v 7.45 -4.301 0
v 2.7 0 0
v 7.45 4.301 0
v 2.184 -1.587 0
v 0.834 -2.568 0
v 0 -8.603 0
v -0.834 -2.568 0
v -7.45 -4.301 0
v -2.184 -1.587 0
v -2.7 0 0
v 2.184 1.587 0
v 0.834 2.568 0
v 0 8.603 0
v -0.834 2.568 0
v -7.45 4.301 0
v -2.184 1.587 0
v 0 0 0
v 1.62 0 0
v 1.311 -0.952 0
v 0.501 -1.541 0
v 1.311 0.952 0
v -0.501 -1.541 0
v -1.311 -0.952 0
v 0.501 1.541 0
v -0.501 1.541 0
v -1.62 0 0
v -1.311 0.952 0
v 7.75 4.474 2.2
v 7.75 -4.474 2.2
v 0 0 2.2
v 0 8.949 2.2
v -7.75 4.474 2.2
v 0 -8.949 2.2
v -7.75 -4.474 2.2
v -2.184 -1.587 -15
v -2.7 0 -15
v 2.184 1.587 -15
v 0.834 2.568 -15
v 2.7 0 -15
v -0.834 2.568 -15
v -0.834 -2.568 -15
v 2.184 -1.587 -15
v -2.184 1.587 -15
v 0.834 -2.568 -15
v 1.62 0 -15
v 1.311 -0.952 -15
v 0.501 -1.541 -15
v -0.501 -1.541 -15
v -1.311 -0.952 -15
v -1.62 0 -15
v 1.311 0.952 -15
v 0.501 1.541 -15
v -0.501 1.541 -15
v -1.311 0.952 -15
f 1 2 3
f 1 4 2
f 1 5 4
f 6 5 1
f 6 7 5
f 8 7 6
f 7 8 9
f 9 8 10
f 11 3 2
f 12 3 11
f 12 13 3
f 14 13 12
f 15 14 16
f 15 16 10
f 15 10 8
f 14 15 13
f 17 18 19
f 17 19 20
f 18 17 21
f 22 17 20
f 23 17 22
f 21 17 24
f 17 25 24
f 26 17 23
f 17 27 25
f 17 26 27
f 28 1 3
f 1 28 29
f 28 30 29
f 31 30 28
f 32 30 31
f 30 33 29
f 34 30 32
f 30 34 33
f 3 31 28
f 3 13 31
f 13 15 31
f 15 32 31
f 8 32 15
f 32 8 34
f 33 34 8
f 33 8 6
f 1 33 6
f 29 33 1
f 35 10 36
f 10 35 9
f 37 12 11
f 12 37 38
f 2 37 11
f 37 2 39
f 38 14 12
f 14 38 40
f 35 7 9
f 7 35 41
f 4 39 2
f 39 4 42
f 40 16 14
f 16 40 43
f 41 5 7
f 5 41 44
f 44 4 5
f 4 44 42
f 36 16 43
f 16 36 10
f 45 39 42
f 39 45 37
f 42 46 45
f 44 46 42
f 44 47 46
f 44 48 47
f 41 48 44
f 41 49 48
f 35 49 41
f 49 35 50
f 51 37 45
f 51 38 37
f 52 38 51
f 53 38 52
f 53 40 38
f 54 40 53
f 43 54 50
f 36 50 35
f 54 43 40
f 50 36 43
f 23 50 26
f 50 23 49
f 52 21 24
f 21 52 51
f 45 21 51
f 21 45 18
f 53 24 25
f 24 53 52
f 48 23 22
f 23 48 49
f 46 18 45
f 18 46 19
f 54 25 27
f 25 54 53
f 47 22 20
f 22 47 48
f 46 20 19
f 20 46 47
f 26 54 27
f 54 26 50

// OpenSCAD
// file: ../Lib/HexGrid.scad
//Size of the hexagons, from one end to another
hexDiameter = 17.5;

//Height of the different pieces
hexHeight = 2.2;
hexMiddleHeight = 1.6;

//Thickness of a beam of the hex piece
beamThickness = 1;

//By how much should the polygon piece slope at the bottom layer?
hexPlay = 0.3;

//Generate a parenting node for the according hexagon
function hexNode(hexagon, height = hexHeight + hexMiddleHeight, rotation = 0) =
			//Translative coordinates
			[	[	hexDiameter * hexagon[0] + ((hexagon[1] % 2 != 0) ? hexDiameter/2 : 0),
					hexDiameter * sin(60) * hexagon[1],
					height],
			//Rotation coordinates
				[	0, 0, 60 * rotation] ];

module hexSegment(b2, t2, b1 = 0.0001, t1 = 0.0001, h) {
	fixDist = 0;

	render(convexity = 3)
	for(i=[0:5]) rotate([0, 0, i * 60])
	polyhedron(
		points = [	//Lower segments
					[b1, -tan(30) *b1, 0],	//0 - bottom left
					[b1,  tan(30) *b1, 0],	//1 - top left
					[b2,  tan(30) *b2, 0],	//2 - top right
					[b2, -tan(30) *b2, 0],	//3 - bottom right
					//Upper segments
					[t1, -tan(30 - fixDist) *t1, h],	//4 - bottom left
					[t1,  tan(30 - fixDist) *t1, h],	//5 - top left
					[t2,  tan(30 - fixDist) *t2, h],	//6 - top right
					[t2, -tan(30 - fixDist) *t2, h]],	//7 - bottom right
		faces = [
					[0, 3, 2, 1],	//Bottom face
					[4, 5, 6, 7],	//Top face
					[2, 3, 7, 6],	//Front face

					[0, 1, 5, 4],	//Back face

					[0, 4, 7, 3],	//Left face

					[1, 2, 6, 5]] );	//Right face
}

module lowerHex() {
	hexSegment(	hexDiameter /2 - beamThickness - hexPlay,
					hexDiameter /2 - beamThickness,
					hexDiameter /2 - beamThickness *2,
					hexDiameter /2 - beamThickness *2,
					hexHeight);
}

module lowerFill() {
	hexSegment(	 hexDiameter /2 - beamThickness - hexPlay,
					hexDiameter /2 - beamThickness,
					0.0001,
					0.0001,
					hexHeight);
}

module hexFill() {
	lowerFill();
	lowerHex();
}

module hexBase(filled = true) {
		translate([0, 0, -3.2]) if(filled) hexFill(); else lowerHex();
		translate([0, 0, -1]) hexSegment(17.5/2 - 1, 17.5/2 + 0.01, filled ? 0.01 : 17.5/2 - 2, filled ? 0.01 : 17.5/2 - 1.5, h = 1);
}

module middleHex(aligned = true) {
	if(aligned)
		translate([0, 0, hexHeight]) middleHex(false);
	else
		hexSegment(	hexDiameter/2 - beamThickness,
						hexDiameter/2,
						hexDiameter/2 - beamThickness *2,
						hexDiameter/2 - beamThickness,
						hexMiddleHeight);
}

module upperHex(aligned = true) {
	if(aligned)
		translate([0, 0, hexHeight + hexMiddleHeight]) upperHex(false);
	else
		hexSegment(	hexDiameter/2,
						hexDiameter/2,
						hexDiameter/2 - beamThickness,
						hexDiameter/2 - beamThickness,
						hexHeight);
}

module hex() {
	lowerHex();
	middleHex();
	upperHex();
}

module hexPattern(i) {
	render() for(x=i) {
		if(x[1] % 2 != 0)
			translate([hexDiameter * x[0] + hexDiameter/2, x[1] * hexDiameter * sin(60)]) children();
		else
			translate([hexDiameter * x[0], x[1] * sin(60) * hexDiameter]) children();
	}
}
// main file
use <../Lib/HexGrid.scad>

holder_distance = 15;


lowerFill();
translate([0, 0, -holder_distance]) difference() {
	$fn = 10;
	cylinder(r = 1.5 + 1.2, h = holder_distance);
	cylinder(r = 1.5 + 0.12, h = holder_distance);
}
